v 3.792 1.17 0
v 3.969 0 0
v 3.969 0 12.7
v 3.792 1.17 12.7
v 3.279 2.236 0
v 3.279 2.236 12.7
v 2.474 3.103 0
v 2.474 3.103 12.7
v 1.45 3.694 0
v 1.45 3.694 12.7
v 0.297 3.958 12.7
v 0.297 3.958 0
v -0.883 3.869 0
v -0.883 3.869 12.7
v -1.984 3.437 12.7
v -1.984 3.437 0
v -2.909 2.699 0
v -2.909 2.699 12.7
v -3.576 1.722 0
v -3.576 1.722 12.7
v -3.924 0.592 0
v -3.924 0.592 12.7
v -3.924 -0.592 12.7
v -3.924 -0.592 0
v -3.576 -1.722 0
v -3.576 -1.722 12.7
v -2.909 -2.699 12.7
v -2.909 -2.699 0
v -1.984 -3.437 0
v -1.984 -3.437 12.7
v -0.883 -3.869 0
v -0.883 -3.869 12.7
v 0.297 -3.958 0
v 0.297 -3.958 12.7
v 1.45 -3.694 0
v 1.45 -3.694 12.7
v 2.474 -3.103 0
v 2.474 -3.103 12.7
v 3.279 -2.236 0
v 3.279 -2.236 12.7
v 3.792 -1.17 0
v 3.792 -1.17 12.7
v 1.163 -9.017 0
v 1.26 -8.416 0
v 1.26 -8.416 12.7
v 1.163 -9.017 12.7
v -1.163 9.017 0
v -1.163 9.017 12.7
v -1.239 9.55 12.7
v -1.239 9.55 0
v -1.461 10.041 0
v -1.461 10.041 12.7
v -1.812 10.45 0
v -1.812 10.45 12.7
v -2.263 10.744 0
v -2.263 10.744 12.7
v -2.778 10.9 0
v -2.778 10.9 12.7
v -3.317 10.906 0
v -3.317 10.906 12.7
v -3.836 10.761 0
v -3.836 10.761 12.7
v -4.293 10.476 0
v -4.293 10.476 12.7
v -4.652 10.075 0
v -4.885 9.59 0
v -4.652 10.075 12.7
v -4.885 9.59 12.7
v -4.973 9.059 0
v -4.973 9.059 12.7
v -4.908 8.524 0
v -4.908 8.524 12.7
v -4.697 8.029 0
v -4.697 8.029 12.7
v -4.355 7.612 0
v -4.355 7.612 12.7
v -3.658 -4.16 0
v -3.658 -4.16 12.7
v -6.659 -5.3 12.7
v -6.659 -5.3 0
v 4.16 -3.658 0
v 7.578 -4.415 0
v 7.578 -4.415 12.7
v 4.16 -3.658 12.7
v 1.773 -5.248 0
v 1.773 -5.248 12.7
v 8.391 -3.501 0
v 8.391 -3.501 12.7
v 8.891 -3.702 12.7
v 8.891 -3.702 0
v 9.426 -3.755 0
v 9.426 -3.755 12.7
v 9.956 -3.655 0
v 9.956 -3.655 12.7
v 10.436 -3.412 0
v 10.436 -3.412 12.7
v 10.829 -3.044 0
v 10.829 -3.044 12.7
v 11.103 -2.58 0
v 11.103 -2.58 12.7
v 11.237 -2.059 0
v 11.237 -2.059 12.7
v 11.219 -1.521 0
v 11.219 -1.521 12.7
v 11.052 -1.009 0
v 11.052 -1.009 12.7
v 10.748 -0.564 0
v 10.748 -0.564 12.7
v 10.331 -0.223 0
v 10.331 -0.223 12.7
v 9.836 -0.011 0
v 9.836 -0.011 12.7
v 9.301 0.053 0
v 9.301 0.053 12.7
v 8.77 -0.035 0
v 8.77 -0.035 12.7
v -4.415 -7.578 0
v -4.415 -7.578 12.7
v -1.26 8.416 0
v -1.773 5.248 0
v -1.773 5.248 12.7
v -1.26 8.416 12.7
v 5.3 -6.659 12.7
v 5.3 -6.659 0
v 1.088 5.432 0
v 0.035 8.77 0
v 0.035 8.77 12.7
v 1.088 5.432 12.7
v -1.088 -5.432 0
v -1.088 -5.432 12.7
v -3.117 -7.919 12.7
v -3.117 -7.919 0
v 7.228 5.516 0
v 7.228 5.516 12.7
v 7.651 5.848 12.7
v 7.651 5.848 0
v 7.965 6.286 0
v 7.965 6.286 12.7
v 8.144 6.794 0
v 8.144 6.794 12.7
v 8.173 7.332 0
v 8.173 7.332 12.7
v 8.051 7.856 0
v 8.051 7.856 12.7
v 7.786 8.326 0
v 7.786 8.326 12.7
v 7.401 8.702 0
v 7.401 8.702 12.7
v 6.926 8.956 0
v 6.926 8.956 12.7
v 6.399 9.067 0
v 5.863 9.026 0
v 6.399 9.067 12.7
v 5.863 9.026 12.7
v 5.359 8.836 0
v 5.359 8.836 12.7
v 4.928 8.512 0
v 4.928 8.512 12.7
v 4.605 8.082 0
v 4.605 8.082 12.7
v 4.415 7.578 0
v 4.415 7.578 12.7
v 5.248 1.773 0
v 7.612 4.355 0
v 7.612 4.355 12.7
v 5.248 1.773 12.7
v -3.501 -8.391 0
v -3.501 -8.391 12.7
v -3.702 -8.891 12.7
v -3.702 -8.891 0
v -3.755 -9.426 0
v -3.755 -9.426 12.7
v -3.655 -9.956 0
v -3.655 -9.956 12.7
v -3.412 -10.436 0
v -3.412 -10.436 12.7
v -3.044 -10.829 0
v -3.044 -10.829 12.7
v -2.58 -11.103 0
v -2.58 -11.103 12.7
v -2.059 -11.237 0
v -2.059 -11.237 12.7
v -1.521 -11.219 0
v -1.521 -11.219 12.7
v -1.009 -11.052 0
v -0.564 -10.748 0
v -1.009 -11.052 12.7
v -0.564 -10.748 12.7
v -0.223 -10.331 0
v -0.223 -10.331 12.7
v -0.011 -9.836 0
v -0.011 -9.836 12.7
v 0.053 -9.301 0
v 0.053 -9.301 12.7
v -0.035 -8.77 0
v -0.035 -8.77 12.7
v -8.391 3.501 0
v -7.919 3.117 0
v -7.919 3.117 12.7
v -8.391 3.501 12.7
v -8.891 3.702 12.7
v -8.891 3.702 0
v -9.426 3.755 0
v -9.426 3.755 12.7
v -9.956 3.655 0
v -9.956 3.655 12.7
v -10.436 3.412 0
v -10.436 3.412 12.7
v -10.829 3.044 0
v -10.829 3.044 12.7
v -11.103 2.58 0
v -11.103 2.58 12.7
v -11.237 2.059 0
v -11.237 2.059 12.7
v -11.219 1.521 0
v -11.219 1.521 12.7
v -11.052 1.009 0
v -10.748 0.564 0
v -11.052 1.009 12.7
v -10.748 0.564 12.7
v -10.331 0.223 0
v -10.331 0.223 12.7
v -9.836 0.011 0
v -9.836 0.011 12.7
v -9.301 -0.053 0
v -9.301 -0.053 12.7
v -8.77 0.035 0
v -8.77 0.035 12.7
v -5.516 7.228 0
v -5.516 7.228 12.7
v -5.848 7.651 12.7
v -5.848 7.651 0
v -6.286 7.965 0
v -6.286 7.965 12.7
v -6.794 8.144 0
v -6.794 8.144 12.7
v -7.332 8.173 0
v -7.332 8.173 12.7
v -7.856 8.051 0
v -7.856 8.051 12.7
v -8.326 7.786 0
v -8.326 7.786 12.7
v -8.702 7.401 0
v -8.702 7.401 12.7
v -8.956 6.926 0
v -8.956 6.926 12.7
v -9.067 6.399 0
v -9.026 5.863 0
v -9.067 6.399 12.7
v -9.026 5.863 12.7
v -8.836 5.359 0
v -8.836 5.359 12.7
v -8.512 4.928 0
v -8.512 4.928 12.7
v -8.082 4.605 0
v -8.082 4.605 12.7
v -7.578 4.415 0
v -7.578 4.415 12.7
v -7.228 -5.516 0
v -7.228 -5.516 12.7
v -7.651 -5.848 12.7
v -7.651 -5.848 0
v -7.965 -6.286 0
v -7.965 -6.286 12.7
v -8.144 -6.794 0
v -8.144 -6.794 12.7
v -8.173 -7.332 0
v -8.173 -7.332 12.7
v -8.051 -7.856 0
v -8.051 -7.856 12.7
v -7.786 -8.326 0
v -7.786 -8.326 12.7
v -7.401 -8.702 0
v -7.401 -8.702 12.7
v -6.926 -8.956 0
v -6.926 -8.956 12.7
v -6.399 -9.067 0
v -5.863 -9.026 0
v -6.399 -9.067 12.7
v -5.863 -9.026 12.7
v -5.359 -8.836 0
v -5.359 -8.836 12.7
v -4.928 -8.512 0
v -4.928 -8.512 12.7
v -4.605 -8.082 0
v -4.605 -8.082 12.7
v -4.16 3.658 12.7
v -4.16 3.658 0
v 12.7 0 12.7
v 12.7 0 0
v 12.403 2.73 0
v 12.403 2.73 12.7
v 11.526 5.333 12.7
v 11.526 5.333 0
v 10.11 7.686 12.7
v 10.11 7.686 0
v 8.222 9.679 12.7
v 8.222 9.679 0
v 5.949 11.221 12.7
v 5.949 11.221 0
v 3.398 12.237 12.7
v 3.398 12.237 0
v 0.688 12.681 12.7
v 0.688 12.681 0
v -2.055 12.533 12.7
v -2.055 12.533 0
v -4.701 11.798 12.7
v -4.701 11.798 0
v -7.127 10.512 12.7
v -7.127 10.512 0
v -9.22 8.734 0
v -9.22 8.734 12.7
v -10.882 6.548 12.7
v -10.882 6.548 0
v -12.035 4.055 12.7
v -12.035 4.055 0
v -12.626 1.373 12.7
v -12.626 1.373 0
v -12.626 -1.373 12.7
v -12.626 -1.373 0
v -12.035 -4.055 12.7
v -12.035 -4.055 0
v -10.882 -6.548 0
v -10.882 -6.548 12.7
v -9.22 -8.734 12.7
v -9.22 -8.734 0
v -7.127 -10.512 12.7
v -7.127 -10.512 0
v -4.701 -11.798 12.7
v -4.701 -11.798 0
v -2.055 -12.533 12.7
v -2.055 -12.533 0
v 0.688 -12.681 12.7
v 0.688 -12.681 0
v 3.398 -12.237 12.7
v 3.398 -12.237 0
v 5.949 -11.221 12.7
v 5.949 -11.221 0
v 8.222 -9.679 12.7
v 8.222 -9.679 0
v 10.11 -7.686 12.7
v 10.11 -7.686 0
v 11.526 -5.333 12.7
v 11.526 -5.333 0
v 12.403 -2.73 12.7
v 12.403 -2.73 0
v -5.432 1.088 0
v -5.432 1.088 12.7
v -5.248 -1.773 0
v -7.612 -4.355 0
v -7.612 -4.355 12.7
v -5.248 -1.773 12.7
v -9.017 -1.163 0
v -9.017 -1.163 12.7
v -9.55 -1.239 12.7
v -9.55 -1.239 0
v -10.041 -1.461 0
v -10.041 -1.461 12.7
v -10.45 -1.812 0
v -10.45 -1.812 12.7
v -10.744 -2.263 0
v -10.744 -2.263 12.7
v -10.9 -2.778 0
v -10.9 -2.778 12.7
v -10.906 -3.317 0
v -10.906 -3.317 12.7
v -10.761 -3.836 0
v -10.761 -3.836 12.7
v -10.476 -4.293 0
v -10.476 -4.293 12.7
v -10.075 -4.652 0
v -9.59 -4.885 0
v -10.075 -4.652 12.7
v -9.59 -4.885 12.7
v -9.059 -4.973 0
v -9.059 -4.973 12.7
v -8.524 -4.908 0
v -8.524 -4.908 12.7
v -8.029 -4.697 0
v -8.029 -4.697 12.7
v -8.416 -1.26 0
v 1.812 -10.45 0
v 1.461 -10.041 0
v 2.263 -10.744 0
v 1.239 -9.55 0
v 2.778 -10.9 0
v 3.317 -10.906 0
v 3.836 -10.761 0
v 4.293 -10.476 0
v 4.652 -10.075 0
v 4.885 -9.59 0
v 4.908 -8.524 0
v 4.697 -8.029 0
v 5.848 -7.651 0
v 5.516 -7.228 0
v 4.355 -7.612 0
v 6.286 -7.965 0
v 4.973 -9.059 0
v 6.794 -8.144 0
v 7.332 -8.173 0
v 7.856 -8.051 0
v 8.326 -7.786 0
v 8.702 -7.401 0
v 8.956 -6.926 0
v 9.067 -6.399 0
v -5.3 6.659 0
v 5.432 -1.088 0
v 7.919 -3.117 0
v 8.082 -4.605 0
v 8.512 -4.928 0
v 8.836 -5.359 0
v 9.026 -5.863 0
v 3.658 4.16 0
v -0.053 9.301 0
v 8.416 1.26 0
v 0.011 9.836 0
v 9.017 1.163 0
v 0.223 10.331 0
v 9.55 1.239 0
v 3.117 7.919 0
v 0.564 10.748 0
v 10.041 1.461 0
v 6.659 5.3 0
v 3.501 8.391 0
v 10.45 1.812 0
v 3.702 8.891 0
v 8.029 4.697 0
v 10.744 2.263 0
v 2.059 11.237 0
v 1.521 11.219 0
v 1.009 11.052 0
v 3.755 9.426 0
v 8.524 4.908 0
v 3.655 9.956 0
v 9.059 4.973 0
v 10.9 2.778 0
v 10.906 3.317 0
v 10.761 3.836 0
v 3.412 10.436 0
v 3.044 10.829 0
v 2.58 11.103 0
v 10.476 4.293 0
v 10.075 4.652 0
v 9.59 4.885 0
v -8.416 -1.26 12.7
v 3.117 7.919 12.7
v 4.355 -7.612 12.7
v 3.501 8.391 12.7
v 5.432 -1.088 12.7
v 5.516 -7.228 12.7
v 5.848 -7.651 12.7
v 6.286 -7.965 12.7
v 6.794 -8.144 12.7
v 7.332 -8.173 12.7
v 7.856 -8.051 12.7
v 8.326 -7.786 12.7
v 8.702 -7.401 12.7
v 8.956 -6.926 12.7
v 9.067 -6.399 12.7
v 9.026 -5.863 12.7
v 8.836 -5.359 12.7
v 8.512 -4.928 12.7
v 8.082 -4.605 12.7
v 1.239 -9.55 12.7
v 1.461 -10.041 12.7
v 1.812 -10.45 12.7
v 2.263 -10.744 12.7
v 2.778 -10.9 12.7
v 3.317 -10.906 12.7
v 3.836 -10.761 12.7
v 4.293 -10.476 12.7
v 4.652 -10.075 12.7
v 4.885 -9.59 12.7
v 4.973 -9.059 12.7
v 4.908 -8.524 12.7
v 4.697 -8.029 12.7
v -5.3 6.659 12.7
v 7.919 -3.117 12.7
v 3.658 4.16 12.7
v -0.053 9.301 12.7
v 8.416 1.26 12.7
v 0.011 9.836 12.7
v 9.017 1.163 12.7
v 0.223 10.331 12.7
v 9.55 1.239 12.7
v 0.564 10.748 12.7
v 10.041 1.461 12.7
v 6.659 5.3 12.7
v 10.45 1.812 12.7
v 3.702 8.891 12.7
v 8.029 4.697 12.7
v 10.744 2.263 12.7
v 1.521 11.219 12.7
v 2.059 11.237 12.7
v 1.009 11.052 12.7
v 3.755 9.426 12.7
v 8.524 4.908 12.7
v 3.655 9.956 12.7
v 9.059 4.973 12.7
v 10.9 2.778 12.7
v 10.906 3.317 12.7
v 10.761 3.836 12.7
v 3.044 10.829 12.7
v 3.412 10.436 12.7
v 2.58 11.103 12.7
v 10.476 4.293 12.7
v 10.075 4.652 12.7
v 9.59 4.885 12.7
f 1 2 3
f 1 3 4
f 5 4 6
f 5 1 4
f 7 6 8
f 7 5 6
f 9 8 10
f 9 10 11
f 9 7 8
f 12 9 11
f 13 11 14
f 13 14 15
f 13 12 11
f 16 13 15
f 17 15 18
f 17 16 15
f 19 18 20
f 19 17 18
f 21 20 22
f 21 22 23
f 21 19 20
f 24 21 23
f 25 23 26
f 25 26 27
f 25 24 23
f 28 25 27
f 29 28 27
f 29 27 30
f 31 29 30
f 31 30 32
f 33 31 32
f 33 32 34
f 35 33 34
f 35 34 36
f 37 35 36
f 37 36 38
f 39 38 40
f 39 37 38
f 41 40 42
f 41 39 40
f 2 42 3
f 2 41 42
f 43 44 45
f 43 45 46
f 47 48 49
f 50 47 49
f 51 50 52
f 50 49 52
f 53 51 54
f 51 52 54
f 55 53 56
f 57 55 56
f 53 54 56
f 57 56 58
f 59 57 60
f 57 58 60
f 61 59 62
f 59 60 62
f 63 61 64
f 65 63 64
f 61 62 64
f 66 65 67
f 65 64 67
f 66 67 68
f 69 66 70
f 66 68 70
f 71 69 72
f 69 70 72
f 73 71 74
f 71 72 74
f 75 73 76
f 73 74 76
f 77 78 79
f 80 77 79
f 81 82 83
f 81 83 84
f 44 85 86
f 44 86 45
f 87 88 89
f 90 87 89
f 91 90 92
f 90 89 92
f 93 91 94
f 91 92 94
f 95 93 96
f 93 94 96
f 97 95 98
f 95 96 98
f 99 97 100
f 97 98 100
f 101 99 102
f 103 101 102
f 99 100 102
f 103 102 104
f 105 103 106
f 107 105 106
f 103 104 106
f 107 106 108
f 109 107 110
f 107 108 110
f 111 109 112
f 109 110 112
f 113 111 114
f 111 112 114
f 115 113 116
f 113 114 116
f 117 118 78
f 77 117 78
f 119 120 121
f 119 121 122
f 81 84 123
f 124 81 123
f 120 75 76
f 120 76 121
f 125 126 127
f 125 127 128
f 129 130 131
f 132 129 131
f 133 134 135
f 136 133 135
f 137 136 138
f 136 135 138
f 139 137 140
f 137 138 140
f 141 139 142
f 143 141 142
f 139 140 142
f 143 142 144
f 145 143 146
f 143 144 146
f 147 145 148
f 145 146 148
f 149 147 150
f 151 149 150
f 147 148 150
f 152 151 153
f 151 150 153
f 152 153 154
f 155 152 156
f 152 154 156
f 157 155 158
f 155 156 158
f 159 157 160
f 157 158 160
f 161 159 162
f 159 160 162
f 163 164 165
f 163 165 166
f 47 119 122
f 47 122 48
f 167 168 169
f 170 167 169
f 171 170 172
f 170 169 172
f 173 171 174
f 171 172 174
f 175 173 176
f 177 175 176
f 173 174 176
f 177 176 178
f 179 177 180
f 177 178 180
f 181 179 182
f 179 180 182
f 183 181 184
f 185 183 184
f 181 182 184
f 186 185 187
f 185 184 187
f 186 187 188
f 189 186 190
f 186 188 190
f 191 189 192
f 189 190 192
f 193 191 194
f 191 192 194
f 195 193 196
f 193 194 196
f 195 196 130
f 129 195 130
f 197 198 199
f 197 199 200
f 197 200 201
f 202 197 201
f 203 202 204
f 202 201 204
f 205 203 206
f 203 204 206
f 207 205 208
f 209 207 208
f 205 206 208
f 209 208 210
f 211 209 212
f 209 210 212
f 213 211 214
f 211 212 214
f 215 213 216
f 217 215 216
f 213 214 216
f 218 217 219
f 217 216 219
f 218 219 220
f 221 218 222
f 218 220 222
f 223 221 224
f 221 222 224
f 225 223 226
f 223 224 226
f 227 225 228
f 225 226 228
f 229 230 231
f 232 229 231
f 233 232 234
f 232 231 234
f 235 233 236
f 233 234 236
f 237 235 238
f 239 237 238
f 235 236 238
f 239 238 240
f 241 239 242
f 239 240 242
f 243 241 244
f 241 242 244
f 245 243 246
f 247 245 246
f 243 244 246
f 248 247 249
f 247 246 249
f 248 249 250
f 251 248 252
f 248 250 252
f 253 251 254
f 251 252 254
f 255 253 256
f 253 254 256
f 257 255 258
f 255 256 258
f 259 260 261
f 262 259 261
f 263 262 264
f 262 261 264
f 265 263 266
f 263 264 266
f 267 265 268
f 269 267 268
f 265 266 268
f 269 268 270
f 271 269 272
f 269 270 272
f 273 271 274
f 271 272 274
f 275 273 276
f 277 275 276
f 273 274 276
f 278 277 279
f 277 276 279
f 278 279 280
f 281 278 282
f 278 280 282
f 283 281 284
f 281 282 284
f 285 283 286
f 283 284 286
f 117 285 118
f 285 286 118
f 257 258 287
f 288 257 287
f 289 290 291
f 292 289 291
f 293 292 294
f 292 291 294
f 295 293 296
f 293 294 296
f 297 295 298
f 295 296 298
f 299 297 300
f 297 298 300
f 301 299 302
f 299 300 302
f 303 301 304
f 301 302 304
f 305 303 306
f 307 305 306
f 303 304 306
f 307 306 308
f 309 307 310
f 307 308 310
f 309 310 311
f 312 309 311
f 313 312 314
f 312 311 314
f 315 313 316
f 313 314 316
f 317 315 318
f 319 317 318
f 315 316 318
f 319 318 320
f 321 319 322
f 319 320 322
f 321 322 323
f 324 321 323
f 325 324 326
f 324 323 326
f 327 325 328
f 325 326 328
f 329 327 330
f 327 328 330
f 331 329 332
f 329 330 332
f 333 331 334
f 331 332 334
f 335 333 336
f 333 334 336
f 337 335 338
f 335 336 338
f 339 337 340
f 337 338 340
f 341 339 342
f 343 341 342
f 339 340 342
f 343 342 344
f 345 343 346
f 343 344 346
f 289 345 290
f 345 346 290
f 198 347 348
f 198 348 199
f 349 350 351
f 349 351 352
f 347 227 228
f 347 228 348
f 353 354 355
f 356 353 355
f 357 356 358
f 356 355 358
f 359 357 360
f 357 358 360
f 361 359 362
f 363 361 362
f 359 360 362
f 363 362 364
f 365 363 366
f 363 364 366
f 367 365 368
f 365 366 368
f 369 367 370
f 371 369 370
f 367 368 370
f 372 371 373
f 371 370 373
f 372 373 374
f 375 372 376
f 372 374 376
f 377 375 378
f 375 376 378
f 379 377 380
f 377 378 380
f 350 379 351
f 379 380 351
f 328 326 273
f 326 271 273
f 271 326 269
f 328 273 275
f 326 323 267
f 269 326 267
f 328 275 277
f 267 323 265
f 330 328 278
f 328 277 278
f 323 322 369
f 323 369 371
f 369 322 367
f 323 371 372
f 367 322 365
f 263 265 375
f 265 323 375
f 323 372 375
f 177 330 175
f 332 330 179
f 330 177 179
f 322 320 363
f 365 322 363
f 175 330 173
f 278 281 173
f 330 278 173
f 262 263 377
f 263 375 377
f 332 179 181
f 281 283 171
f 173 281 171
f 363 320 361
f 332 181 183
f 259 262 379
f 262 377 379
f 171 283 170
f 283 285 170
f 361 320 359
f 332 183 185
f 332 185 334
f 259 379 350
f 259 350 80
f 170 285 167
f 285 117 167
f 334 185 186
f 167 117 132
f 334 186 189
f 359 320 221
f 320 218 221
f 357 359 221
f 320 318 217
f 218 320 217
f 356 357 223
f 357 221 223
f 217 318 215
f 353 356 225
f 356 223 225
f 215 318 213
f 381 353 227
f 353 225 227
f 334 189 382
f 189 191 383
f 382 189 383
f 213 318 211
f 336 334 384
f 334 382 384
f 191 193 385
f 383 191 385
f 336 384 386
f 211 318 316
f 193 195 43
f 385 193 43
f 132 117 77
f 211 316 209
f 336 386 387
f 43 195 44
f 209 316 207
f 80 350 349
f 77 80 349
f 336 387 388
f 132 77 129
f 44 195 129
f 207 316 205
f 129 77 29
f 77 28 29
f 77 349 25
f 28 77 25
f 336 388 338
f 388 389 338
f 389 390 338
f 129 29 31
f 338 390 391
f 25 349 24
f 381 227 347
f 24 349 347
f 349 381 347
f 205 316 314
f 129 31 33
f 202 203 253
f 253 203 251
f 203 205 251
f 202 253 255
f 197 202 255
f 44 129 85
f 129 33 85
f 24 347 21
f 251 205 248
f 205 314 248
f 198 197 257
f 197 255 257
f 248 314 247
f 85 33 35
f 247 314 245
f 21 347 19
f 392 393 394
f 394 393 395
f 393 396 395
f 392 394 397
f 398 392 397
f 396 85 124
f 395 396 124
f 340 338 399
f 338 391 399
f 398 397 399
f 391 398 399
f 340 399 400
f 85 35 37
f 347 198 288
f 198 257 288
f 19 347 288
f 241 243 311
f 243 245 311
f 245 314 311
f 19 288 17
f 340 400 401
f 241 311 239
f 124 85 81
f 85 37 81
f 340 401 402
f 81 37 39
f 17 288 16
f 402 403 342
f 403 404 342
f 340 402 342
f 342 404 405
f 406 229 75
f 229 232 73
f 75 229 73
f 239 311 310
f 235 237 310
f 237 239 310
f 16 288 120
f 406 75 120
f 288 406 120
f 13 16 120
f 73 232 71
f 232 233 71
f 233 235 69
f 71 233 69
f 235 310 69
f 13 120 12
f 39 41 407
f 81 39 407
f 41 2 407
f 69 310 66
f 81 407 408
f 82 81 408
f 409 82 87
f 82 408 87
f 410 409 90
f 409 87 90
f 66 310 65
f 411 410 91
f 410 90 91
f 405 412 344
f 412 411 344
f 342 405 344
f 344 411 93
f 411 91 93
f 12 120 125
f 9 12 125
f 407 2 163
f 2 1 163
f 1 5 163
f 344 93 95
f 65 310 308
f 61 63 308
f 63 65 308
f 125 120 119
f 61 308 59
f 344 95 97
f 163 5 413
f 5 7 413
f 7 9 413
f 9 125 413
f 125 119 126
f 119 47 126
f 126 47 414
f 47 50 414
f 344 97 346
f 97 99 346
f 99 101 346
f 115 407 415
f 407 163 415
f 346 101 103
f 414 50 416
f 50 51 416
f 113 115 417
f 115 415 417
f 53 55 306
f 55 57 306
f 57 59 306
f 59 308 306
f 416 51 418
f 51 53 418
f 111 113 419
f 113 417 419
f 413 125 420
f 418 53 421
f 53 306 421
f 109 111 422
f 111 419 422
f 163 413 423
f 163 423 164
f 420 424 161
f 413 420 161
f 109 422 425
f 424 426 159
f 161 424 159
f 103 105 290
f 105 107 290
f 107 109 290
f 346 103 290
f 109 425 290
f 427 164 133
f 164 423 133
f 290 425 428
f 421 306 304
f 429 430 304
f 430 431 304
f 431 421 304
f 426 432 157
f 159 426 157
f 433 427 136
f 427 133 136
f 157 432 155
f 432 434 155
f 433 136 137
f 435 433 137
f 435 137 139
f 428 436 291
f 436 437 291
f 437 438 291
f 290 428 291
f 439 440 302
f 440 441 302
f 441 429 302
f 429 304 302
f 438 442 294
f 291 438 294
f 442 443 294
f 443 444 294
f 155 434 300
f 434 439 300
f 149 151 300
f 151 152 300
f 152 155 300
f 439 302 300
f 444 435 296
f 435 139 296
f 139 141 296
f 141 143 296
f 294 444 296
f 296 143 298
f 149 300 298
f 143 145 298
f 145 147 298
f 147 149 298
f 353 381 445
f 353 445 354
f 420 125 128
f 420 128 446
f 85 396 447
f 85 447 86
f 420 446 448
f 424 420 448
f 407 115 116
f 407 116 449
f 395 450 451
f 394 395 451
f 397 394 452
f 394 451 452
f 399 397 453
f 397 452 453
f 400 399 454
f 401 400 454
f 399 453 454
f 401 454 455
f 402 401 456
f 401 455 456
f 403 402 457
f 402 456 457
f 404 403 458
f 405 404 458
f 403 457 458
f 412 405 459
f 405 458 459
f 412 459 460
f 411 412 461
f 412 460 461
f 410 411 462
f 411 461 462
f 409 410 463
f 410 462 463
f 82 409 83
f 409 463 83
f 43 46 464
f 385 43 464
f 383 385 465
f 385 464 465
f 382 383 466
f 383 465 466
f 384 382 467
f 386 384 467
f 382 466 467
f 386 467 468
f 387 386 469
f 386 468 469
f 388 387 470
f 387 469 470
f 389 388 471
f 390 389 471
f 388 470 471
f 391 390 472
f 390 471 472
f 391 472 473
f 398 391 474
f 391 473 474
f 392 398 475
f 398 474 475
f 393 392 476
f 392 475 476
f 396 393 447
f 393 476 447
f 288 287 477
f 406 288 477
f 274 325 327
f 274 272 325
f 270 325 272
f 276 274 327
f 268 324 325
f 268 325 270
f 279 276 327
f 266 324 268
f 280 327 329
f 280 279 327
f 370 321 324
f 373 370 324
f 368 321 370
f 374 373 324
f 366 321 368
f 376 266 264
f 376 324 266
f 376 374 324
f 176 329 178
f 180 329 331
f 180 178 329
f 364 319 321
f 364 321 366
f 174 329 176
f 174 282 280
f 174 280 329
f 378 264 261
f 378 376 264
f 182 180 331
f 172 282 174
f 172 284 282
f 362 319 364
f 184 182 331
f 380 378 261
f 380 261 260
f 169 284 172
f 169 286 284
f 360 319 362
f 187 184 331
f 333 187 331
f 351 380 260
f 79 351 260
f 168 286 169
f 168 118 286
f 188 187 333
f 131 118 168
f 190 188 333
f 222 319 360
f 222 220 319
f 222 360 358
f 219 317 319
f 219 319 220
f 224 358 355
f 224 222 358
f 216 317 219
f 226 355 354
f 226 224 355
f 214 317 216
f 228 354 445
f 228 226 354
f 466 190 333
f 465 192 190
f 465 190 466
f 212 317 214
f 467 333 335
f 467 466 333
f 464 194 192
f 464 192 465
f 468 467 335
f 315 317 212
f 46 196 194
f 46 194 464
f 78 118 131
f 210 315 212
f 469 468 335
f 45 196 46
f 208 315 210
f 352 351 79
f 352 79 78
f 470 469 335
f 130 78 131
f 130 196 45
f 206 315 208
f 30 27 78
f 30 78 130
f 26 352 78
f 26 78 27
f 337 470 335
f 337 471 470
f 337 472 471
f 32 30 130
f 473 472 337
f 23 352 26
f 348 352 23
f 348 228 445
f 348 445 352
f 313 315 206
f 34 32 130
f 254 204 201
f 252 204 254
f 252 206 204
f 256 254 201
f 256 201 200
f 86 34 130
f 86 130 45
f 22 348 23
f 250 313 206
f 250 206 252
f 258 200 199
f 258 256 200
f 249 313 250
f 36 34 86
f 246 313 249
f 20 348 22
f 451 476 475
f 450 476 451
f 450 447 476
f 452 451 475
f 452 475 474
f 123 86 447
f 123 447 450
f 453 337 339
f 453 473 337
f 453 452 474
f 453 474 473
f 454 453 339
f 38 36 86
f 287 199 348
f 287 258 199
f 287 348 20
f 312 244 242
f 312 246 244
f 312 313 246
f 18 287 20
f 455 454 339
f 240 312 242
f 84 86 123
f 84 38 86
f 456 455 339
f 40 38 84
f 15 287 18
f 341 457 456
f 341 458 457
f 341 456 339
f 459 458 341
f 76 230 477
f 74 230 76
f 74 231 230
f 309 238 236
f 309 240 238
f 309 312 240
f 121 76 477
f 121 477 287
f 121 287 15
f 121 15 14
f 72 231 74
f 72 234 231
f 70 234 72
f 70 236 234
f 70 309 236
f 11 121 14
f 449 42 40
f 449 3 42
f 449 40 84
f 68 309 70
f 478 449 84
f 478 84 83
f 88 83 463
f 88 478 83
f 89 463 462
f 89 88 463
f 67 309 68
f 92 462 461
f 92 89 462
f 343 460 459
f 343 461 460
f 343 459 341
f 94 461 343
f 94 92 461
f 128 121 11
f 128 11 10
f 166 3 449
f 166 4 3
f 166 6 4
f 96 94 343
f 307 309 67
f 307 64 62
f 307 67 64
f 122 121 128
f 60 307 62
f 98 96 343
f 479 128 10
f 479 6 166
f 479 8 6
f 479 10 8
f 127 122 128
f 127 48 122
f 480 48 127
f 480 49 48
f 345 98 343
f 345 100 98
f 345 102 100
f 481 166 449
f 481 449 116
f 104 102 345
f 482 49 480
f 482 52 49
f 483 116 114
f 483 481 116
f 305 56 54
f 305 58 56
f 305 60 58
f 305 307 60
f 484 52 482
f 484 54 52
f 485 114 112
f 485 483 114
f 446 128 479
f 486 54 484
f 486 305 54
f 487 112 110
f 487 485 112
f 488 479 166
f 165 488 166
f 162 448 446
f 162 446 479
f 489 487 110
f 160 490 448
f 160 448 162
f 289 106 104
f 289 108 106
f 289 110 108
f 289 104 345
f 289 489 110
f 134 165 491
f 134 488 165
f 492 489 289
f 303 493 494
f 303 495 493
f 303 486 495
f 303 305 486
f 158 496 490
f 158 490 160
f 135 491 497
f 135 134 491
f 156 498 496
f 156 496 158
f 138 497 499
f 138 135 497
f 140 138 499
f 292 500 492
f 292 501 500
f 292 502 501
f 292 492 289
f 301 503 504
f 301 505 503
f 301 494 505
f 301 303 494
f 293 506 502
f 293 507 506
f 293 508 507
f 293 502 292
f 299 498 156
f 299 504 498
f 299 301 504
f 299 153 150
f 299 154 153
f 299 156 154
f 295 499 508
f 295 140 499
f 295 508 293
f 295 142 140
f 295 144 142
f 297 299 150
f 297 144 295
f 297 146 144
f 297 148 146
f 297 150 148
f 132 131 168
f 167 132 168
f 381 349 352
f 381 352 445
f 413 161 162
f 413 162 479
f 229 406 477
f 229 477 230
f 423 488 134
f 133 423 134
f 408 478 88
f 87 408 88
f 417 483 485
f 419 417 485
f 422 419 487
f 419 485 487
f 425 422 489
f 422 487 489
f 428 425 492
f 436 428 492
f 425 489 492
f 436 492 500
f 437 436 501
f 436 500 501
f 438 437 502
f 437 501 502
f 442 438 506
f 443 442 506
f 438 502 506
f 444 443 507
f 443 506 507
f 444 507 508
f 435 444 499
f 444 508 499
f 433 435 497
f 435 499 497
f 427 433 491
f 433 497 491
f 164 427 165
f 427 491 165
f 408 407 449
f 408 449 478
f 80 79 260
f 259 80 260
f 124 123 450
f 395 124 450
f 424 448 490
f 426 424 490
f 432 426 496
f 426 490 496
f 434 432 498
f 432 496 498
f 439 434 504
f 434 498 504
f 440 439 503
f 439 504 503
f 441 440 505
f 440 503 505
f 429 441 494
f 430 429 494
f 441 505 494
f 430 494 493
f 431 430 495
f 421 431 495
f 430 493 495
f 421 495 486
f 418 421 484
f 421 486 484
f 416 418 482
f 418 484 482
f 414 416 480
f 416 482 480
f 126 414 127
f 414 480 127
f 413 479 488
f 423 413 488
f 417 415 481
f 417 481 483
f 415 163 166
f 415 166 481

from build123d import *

# Parameters (mm, degrees)
SKETCH1_R           = 12.7
SKETCH1_R_2         = 3.96875
BOSS_EXTRUDE1_DEPTH = 12.7
CUT_EXTRUDE1_DEPTH  = 22.997045256
CIRPATTERN1_COUNT   = 12


with BuildPart() as part:
    # Sketch1 → Boss-Extrude1 (new body)
    with BuildSketch(Plane.XY):
        Circle(SKETCH1_R)
        Circle(SKETCH1_R_2, mode=Mode.SUBTRACT)
    extrude(amount=BOSS_EXTRUDE1_DEPTH)

    # Sketch2 → Cut-Extrude1 (cut, through all)
    with BuildSketch(Plane.XY.offset(12.7)):
        with BuildLine():
            Line((-4.354775644, 7.61249898), (-1.77319664, 5.248090699))
            Line((-1.77319664, 5.248090699), (-1.260387004, 8.416402273))
            Line((-1.260387004, 8.416402273), (-1.163123324, 9.017330218))
            ThreePointArc((-1.163123324, 9.017330218), (-3.83557115, 10.7609038), (-4.354775644, 7.61249898))
        make_face()
    cut_extrude1 = extrude(amount=-CUT_EXTRUDE1_DEPTH, mode=Mode.SUBTRACT)

    # CirPattern1: Cut-Extrude1 ×12 about axis
    cirpattern1_axis = Axis((0, 0, 0), (0, 0, 1))
    for i in range(1, CIRPATTERN1_COUNT):
        add(cut_extrude1.rotate(cirpattern1_axis, i * 360 / CIRPATTERN1_COUNT), mode=Mode.SUBTRACT)


solid = part.part
